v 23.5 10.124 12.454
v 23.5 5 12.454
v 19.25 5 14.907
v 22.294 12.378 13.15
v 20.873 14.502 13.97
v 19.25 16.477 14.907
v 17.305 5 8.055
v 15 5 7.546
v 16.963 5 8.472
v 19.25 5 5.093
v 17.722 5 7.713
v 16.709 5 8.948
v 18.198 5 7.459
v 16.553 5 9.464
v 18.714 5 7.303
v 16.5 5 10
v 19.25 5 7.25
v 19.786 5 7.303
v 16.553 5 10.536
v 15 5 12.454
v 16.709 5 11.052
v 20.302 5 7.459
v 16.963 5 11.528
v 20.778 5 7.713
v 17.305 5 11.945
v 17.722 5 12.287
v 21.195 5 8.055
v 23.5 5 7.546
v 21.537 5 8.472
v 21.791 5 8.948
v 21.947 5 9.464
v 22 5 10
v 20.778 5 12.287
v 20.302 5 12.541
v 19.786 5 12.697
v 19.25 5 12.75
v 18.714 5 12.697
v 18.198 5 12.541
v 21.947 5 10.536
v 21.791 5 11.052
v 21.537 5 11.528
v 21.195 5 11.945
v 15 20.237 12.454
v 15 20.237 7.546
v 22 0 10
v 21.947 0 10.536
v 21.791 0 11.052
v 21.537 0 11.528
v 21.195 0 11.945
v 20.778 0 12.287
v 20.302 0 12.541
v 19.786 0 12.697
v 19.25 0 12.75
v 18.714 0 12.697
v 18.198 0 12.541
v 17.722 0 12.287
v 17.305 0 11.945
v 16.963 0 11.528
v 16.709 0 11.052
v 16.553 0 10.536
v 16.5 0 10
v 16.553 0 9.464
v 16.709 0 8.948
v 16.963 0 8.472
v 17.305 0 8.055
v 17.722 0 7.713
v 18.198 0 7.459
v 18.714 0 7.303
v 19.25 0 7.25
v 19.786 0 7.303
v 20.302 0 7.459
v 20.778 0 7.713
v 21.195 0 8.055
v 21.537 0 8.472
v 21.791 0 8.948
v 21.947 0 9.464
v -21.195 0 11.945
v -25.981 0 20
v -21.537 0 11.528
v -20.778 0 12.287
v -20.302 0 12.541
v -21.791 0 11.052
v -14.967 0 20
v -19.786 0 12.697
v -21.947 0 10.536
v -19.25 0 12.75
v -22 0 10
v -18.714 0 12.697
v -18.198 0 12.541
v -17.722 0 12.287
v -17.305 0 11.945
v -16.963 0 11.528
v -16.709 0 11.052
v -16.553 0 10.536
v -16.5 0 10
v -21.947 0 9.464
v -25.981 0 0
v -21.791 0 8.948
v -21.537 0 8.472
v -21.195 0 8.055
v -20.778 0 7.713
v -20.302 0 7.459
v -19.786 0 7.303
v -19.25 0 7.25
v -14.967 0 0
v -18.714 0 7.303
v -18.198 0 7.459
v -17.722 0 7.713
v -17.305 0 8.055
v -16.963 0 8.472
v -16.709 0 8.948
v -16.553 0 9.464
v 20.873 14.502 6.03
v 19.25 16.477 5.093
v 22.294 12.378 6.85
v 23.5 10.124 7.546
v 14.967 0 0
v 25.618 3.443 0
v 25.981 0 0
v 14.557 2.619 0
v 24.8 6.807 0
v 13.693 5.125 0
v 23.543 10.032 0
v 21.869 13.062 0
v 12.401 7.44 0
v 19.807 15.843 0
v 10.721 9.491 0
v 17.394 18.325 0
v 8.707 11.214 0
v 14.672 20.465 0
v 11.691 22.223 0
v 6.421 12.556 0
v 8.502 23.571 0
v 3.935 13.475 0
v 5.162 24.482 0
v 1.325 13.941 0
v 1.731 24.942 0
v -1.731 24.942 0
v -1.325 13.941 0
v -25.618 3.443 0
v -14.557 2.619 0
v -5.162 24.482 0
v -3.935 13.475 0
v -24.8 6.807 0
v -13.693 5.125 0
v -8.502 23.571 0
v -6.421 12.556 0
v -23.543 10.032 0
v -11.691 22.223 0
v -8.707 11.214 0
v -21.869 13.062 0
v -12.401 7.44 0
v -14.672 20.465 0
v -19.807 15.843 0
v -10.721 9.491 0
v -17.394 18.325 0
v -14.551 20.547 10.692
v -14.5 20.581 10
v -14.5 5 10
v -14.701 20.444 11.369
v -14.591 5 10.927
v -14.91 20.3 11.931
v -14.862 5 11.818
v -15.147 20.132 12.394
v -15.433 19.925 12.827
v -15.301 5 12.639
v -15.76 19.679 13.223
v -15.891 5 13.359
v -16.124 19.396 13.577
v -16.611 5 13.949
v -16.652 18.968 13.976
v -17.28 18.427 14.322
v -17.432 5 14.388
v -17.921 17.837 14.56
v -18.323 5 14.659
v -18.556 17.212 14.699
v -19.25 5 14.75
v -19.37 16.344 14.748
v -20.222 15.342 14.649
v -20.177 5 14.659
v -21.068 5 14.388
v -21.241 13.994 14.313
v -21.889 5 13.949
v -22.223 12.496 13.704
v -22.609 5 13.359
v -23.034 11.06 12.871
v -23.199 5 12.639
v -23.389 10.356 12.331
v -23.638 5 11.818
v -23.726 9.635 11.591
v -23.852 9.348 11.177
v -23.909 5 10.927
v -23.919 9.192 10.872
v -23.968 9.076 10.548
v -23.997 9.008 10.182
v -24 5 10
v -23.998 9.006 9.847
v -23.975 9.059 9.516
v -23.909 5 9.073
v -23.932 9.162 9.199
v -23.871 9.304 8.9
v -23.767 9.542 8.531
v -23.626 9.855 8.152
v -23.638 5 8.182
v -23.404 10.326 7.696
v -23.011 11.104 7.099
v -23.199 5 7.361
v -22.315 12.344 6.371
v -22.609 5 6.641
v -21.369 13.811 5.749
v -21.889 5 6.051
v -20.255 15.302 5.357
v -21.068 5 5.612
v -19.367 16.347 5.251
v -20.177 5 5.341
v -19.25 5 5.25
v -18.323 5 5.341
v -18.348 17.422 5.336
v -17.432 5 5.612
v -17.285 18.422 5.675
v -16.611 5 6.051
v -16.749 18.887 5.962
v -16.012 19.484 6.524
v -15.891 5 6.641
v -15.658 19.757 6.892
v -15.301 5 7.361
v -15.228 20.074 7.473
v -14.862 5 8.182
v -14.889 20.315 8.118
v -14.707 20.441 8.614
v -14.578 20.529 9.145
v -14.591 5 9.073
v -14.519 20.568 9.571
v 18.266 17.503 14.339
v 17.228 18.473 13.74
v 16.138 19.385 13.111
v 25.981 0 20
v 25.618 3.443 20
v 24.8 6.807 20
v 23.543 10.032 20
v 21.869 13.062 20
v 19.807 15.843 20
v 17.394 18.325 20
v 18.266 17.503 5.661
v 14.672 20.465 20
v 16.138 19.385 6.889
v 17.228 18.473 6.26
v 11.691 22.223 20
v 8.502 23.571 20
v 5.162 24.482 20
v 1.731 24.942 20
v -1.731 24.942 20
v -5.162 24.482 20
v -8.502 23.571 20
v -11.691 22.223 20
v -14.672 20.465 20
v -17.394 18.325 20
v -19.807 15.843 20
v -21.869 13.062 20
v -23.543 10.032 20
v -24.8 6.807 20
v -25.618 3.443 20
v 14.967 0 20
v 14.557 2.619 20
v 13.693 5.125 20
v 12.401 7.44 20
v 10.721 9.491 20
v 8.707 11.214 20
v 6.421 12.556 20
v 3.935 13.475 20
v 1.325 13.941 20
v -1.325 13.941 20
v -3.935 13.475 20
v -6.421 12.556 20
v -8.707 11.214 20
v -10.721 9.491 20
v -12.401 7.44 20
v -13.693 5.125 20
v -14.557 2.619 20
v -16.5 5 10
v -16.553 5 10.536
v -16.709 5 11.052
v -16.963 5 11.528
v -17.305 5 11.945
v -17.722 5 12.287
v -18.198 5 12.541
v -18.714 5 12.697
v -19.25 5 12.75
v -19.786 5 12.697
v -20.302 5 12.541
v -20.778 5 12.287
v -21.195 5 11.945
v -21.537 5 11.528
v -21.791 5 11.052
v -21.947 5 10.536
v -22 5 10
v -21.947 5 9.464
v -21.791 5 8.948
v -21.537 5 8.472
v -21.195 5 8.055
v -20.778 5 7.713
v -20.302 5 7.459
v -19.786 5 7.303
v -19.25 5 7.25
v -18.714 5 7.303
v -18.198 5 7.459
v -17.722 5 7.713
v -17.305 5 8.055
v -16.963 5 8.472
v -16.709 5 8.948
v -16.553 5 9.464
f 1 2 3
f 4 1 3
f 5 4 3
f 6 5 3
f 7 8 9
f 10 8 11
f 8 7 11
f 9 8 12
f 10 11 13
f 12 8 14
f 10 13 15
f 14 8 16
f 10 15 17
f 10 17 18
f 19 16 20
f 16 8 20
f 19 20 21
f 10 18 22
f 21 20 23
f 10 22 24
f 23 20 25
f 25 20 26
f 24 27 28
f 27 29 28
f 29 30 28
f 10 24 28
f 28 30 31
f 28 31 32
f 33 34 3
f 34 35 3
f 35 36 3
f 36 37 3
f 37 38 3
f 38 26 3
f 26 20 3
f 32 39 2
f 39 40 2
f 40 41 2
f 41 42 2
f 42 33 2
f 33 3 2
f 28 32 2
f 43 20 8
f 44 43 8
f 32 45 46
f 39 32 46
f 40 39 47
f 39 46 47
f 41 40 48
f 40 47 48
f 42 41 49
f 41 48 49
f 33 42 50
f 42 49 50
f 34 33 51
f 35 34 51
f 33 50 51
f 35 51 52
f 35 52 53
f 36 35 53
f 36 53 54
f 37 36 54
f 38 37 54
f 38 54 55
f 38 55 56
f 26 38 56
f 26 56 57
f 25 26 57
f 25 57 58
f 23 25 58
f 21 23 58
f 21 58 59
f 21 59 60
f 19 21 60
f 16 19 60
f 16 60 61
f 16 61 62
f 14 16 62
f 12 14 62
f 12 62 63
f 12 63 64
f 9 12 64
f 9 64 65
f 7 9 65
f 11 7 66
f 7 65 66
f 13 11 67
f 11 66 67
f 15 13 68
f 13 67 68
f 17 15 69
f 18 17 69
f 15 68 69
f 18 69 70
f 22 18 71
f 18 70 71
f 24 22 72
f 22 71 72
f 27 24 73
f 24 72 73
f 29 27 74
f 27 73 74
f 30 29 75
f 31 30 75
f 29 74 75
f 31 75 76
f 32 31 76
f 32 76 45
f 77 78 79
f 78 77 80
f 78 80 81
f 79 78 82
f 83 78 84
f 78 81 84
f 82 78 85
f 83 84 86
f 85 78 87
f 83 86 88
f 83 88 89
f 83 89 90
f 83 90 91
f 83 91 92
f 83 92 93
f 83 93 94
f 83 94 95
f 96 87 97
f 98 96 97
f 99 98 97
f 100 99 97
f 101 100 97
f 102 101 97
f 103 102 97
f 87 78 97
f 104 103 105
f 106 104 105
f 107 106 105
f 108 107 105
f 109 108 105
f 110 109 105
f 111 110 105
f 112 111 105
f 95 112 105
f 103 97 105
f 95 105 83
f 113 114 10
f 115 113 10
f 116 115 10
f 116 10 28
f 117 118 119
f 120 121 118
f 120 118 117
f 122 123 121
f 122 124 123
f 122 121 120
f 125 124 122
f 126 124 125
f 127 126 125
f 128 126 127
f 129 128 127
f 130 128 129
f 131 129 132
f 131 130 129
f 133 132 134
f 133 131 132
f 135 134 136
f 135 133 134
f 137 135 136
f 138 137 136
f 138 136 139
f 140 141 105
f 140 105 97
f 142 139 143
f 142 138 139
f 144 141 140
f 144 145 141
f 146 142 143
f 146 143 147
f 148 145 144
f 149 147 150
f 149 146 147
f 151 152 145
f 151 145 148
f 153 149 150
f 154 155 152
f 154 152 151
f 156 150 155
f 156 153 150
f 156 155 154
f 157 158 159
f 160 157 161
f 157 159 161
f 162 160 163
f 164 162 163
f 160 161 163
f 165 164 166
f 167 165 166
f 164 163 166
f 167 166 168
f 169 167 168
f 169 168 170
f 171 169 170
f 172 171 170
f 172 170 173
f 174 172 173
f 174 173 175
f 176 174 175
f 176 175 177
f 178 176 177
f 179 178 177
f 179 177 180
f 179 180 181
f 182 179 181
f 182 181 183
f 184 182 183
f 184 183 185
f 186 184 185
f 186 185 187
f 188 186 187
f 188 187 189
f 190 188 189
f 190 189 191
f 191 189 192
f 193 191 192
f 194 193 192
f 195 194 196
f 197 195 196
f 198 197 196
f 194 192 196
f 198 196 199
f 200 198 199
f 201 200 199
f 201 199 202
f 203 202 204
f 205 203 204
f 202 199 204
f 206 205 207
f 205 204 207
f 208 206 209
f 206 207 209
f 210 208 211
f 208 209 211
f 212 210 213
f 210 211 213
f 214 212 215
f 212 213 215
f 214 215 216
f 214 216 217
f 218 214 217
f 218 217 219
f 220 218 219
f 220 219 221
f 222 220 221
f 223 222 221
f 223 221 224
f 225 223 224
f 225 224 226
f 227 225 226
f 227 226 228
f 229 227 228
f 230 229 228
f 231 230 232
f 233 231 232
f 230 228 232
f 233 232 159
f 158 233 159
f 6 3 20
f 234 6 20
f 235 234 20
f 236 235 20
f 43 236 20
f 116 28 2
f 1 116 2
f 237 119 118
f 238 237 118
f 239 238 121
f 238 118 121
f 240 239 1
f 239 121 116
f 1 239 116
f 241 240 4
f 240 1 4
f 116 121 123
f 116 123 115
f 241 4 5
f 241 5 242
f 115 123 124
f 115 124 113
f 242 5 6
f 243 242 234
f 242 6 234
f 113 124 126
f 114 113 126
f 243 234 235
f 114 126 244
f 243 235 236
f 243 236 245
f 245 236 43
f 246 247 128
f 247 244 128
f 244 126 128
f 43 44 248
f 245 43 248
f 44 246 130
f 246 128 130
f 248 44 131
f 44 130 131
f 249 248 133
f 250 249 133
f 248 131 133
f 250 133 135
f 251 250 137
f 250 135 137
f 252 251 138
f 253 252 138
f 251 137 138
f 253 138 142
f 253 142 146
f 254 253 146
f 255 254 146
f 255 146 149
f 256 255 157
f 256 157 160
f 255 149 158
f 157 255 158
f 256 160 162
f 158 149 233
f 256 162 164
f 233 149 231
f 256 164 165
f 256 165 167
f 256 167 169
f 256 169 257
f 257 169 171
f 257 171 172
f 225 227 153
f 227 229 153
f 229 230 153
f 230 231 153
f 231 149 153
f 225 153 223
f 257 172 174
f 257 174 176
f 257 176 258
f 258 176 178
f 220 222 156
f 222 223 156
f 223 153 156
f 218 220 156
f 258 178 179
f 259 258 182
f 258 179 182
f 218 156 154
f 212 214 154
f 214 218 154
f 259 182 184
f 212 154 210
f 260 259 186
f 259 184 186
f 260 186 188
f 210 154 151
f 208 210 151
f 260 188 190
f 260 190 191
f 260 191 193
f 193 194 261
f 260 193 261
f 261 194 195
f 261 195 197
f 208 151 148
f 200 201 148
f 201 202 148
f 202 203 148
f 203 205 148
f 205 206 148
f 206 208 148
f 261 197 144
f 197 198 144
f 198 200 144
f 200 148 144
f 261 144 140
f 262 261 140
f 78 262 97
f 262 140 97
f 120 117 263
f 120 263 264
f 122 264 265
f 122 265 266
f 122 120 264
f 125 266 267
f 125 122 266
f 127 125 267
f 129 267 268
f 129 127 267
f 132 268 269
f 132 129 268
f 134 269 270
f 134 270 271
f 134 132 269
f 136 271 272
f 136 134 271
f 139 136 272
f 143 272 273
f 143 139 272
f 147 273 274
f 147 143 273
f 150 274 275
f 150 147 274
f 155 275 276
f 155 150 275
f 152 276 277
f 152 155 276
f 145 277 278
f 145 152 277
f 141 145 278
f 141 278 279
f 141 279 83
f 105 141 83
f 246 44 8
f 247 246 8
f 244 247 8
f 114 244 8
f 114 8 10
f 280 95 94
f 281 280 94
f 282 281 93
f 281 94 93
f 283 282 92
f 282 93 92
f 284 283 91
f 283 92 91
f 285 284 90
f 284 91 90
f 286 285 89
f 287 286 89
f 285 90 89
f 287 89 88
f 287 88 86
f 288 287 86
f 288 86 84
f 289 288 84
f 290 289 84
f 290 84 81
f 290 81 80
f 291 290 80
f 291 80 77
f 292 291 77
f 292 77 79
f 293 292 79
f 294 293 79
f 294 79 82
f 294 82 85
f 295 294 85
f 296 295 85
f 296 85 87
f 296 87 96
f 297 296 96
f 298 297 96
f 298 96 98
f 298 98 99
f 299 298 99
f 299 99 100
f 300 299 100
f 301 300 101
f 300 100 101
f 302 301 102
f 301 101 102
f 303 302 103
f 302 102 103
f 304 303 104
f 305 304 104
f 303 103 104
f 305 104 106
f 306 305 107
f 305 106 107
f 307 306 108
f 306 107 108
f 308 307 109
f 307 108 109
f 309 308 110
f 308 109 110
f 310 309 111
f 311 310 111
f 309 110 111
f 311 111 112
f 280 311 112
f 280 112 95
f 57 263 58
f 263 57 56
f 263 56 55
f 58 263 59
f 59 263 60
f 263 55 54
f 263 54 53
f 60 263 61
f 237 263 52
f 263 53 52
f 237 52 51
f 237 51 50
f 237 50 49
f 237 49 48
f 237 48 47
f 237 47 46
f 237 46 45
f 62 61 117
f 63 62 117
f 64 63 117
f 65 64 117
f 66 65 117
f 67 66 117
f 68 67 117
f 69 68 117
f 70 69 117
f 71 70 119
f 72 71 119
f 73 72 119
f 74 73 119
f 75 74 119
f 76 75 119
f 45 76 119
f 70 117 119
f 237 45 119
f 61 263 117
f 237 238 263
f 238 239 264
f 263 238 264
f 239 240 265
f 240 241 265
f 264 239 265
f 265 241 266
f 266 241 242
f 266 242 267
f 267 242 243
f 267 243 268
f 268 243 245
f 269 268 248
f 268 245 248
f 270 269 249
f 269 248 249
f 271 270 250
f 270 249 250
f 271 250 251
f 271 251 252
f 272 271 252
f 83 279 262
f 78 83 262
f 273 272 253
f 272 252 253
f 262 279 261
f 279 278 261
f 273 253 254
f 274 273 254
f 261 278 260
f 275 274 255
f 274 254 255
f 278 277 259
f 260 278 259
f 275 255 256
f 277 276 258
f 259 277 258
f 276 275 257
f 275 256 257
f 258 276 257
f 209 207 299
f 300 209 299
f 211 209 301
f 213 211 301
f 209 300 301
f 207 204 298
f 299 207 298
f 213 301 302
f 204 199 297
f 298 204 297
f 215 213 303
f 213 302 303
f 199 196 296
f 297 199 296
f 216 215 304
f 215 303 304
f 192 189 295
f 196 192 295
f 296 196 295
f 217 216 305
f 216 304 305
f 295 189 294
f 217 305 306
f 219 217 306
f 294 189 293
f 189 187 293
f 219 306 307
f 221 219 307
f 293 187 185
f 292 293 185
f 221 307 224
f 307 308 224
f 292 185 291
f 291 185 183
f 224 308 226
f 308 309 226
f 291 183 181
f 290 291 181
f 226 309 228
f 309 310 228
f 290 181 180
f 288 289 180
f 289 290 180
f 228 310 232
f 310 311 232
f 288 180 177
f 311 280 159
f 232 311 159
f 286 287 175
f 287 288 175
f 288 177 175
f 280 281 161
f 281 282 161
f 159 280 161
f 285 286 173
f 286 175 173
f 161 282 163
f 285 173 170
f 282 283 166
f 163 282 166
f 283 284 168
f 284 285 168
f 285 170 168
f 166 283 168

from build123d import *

# Parameters (mm, degrees)
PAD_DEPTH       = 20
SKETCH001_R     = 2.75
POCKET_DEPTH    = 25.001
SKETCH002_R     = 4.75
POCKET001_DEPTH = 20.001


with BuildPart() as part:
    # Sketch → Pad (new body)
    with BuildSketch(Plane.XY):
        with BuildLine():
            ThreePointArc((14.96663, 0), (0, 14), (-14.96663, 0))
            Line((-25.980762, 0), (-14.96663, 0))
            ThreePointArc((25.980762, 0), (0, 25), (-25.980762, 0))
            Line((14.96663, 0), (25.980762, 0))
        make_face()
    extrude(amount=PAD_DEPTH)

    # Sketch001 (on Face2 of Pad) → Pocket (cut, through all)
    with BuildSketch(Plane.XZ):
        with Locations((-19.25, 10)):
            Circle(SKETCH001_R)
        with Locations((19.25, 10)):
            Circle(SKETCH001_R)
    extrude(amount=-POCKET_DEPTH, mode=Mode.SUBTRACT)

    # Sketch002 (on DatumPlane) → Pocket001 (cut, through all)
    with BuildSketch(Plane.XZ.offset(-5)):
        with Locations((-19.25, 10)):
            Circle(SKETCH002_R)
        Polygon((19.25, 5.092523), (23.5, 7.546261), (23.5, 12.453739), (19.25, 14.907477), (15, 12.453739), (15, 7.546261), align=None)
    extrude(amount=-POCKET001_DEPTH, mode=Mode.SUBTRACT)


solid = part.part
